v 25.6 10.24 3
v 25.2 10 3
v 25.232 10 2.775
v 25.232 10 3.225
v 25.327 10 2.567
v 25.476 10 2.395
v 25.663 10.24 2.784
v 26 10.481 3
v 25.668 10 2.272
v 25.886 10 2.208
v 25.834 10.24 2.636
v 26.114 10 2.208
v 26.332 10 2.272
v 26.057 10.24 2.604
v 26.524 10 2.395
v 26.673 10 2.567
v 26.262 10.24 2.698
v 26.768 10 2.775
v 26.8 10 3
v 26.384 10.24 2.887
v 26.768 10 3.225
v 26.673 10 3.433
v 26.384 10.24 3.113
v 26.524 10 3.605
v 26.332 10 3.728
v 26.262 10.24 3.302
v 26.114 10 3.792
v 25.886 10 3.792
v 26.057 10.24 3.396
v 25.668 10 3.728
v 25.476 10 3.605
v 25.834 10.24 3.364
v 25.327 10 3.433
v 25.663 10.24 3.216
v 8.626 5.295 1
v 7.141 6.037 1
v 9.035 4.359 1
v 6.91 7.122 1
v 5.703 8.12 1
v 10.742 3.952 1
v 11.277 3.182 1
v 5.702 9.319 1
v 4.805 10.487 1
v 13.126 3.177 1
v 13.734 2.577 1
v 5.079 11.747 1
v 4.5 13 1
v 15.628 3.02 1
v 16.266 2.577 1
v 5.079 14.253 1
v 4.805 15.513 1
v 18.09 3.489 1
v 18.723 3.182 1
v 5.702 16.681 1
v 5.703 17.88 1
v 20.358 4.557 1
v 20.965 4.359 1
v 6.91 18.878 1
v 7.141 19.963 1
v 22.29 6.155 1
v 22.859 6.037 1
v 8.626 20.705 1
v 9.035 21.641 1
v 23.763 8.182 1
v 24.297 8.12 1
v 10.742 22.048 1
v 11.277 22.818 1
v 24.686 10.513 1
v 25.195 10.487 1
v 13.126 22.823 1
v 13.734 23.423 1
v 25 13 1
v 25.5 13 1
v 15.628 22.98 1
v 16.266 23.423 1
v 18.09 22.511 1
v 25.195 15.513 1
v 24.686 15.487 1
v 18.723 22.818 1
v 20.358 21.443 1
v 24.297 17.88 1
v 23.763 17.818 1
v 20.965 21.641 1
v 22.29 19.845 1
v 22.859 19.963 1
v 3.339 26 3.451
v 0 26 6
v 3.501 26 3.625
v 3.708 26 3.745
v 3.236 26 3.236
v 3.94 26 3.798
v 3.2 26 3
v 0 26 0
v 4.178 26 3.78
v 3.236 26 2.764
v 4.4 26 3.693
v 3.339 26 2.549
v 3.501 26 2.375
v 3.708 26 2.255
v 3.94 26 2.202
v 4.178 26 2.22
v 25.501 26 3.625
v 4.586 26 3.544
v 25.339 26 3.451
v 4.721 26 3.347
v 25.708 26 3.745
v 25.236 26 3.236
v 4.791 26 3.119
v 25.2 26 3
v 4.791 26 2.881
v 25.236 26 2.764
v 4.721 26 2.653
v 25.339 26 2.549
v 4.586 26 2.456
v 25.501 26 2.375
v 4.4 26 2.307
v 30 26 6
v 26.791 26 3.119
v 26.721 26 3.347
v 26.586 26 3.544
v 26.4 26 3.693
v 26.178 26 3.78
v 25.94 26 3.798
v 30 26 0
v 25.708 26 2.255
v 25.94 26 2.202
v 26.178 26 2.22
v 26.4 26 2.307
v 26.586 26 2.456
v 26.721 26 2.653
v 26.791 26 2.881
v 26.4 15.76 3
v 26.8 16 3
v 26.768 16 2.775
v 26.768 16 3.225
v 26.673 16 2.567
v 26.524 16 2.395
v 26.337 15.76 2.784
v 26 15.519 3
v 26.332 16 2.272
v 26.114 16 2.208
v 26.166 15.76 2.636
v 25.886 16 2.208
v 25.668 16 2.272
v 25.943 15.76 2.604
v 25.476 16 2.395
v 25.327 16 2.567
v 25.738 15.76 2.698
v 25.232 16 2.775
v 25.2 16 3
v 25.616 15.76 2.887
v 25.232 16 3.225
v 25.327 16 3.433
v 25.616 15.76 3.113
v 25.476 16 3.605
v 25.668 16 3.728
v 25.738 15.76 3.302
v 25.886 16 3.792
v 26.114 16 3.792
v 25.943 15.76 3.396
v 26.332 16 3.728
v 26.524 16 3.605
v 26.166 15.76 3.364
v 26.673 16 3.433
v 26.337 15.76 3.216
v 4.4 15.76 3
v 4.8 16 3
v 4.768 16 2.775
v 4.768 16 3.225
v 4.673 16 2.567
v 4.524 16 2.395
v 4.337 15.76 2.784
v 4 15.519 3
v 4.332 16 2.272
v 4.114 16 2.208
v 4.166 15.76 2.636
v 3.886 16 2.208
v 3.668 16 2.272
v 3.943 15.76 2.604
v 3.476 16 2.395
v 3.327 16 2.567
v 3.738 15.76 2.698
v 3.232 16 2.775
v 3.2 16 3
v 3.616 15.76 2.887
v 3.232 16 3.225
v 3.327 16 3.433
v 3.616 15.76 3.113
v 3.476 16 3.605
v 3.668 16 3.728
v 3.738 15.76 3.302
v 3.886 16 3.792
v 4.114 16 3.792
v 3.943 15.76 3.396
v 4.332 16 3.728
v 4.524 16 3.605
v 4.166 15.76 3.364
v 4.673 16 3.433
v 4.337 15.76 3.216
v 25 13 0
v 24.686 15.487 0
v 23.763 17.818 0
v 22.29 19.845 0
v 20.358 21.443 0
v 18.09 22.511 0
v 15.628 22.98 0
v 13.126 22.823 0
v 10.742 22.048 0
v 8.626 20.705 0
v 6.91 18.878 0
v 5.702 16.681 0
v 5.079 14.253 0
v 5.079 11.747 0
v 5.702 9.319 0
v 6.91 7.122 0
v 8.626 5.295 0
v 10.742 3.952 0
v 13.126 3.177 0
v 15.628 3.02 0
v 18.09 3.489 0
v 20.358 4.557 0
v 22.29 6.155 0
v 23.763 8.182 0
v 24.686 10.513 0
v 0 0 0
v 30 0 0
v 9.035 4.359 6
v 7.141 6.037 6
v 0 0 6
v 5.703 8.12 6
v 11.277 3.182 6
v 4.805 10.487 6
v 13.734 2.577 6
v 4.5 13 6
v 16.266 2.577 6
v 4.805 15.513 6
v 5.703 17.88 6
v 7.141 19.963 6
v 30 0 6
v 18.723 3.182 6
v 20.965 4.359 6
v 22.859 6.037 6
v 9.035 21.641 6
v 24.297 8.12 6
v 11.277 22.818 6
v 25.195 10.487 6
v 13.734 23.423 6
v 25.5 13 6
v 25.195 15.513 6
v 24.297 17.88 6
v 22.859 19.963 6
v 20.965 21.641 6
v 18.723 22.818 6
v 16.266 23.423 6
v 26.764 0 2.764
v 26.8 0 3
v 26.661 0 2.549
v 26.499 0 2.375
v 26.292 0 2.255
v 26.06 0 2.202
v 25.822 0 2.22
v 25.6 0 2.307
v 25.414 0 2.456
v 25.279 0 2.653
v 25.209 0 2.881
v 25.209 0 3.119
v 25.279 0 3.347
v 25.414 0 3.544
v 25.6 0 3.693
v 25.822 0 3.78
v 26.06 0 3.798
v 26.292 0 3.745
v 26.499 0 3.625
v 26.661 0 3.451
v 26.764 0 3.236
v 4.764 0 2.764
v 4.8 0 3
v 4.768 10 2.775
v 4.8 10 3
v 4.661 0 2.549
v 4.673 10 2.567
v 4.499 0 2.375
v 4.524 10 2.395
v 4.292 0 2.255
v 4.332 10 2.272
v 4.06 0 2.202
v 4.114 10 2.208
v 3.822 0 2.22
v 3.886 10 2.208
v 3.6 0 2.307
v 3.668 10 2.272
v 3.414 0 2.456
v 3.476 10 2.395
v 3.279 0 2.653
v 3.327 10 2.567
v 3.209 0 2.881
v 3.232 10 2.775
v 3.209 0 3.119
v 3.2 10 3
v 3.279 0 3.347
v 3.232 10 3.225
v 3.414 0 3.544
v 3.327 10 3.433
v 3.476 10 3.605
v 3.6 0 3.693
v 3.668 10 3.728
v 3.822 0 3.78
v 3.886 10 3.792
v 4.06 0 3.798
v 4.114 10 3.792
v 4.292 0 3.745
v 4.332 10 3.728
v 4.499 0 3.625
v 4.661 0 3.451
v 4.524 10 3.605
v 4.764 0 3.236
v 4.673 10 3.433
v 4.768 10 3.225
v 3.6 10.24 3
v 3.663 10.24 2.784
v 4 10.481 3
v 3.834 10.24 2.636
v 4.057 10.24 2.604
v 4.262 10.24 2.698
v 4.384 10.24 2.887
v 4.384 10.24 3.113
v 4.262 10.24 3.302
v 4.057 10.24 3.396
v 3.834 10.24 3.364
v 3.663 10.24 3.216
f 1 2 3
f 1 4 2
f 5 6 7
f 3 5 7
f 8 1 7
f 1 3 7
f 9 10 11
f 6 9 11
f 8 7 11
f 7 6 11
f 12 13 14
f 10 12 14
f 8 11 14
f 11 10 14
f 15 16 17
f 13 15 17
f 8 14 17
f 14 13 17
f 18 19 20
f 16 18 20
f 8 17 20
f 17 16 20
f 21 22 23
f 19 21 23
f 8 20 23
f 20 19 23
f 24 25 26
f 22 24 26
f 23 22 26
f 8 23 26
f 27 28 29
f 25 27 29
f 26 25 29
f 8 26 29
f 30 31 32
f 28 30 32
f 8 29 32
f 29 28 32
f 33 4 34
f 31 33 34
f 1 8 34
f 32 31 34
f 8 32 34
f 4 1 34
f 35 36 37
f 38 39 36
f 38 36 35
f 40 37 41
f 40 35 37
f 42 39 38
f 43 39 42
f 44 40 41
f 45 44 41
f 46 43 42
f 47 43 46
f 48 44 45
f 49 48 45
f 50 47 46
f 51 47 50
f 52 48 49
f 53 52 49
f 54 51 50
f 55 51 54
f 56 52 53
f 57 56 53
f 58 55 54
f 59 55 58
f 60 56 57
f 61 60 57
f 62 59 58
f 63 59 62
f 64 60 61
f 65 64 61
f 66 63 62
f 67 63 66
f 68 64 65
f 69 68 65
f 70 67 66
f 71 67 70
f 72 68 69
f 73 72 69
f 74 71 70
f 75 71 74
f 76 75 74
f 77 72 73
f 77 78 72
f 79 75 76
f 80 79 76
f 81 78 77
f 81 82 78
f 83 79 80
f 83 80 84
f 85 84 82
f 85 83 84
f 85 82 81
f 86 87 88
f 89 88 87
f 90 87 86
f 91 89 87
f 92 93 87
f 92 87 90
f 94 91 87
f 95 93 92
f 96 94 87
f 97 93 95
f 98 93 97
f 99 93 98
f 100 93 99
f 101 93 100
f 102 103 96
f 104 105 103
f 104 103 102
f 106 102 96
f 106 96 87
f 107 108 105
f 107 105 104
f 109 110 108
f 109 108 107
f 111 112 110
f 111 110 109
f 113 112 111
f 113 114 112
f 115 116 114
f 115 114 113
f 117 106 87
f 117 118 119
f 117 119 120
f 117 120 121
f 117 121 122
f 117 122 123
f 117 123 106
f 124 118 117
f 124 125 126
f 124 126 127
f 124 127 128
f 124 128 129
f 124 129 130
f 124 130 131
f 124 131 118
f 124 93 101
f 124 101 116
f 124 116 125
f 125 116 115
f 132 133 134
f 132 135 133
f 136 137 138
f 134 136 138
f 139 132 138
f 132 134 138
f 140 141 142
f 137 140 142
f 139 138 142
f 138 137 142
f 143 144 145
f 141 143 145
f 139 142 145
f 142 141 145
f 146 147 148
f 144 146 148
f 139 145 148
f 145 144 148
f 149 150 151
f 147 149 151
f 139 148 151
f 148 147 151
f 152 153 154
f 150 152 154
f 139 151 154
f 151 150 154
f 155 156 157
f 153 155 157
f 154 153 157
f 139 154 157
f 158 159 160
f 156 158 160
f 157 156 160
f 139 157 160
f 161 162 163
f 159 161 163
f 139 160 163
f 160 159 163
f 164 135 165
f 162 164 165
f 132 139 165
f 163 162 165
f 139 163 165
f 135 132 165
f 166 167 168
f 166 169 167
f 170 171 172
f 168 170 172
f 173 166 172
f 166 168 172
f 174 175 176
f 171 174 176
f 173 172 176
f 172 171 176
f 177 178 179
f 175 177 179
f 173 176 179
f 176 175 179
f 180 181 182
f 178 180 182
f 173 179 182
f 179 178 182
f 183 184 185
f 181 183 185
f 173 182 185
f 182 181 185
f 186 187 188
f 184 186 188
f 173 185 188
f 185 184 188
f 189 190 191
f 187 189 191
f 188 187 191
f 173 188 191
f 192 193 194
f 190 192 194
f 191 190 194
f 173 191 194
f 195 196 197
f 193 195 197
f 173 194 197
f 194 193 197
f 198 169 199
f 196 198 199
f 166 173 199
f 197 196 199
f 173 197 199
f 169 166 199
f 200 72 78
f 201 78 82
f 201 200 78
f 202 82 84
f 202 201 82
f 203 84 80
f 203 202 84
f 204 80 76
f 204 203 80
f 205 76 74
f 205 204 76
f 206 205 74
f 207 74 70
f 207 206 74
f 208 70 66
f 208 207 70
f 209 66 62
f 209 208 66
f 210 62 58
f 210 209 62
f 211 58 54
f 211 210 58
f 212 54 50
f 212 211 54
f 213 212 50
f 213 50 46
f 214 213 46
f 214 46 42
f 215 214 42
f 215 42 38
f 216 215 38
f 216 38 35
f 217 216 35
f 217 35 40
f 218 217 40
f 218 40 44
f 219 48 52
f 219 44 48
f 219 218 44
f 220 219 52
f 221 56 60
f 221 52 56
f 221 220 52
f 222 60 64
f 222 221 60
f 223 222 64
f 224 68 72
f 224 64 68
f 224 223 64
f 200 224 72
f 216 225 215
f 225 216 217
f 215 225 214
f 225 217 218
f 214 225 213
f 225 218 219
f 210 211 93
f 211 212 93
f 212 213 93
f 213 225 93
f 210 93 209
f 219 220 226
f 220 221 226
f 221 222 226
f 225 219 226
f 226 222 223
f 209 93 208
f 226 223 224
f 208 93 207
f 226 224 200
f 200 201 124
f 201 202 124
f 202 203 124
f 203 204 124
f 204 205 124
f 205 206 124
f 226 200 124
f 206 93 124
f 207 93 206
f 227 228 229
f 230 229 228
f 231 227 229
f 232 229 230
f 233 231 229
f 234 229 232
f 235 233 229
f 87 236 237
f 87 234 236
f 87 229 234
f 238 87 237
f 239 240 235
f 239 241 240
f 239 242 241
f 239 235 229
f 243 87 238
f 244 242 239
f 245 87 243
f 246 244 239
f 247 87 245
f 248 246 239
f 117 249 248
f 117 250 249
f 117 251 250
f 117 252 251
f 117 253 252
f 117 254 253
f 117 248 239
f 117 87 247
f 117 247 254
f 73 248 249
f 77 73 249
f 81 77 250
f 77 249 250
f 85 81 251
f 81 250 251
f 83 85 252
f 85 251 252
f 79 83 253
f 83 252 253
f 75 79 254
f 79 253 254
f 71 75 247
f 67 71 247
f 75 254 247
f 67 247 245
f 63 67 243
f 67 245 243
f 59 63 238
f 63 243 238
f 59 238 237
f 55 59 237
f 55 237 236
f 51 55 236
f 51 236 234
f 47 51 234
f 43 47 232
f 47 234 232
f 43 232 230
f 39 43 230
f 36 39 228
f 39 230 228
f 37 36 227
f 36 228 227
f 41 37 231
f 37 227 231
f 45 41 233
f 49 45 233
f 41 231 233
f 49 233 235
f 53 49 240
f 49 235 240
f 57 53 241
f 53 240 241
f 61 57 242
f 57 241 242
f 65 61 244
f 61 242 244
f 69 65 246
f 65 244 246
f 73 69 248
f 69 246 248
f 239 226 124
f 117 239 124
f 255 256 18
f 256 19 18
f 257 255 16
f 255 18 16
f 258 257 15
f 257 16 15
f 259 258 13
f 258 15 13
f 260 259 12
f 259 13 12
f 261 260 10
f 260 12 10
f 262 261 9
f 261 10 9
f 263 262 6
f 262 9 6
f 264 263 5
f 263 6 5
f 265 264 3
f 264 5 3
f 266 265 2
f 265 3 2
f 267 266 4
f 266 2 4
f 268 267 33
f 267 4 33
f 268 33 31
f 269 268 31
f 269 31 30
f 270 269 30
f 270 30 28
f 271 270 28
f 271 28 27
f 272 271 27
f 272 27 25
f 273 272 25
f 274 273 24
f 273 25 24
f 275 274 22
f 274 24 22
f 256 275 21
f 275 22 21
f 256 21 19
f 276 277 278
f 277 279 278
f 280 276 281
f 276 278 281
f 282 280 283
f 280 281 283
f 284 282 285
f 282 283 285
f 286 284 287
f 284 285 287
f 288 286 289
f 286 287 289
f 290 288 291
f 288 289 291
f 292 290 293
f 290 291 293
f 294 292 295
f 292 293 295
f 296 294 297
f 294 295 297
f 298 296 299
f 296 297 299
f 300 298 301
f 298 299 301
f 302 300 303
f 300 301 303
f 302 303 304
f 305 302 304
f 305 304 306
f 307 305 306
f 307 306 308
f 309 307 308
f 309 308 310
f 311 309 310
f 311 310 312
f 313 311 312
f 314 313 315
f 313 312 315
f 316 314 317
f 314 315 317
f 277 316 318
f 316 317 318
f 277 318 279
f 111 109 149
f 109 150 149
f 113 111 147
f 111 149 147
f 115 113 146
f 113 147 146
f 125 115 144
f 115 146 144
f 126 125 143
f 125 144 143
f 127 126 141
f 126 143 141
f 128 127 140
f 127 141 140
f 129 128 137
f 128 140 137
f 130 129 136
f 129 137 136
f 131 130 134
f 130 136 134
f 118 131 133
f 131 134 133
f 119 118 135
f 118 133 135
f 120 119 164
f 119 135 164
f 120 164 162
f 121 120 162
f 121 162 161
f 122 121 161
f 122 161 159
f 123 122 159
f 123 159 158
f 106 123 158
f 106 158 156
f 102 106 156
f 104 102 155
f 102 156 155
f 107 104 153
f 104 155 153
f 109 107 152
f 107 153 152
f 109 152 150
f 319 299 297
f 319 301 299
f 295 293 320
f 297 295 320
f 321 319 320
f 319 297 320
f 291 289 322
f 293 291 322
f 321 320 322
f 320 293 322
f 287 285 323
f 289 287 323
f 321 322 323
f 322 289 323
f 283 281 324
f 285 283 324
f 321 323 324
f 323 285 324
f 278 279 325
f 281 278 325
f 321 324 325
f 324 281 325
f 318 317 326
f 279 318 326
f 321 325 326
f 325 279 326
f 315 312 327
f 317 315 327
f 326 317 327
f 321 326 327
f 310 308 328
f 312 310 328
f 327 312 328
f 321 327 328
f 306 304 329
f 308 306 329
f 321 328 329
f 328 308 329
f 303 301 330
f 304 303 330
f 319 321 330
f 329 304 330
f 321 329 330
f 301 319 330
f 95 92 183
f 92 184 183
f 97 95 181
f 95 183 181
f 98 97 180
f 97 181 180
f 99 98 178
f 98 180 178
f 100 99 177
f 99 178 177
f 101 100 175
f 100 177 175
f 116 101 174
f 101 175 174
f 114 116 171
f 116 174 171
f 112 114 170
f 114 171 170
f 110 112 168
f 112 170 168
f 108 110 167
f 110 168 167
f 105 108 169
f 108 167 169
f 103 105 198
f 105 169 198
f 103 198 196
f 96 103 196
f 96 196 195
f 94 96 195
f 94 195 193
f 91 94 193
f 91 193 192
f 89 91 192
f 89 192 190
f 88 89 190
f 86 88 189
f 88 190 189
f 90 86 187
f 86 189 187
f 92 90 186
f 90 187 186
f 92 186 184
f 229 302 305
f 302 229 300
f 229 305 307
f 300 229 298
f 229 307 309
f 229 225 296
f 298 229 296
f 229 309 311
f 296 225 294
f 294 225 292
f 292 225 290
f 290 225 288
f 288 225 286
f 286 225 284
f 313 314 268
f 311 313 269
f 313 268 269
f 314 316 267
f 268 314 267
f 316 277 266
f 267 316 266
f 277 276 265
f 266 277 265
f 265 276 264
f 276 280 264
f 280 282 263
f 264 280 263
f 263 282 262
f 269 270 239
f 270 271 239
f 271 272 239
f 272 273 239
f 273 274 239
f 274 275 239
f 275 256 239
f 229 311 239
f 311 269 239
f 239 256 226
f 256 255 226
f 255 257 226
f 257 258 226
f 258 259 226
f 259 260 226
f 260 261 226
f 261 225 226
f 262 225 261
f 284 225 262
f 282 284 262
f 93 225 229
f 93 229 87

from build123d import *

# Parameters (mm, degrees)
ESQUISSE1_W                                   = 30
ESQUISSE1_H                                   = 26
ESQUISSE1_R                                   = 10
BOSS_EXTRU_1_DEPTH                            = 6
ESQUISSE2_R                                   = 10.5
ENL_V_MAT_EXTRU_1_DEPTH                       = 5
TROU_POUR_TARAUDAGE_POUR_TROU_TARAUD_M2_D     = 1.6
TROU_POUR_TARAUDAGE_POUR_TROU_TARAUD_M2_DEPTH = 10
TROU_POUR_TARAUDAGE_POUR_TROU_TARAUD_M2_TIP   = 0.480688495
TROU_POUR_TARAUDAGE_POUR_TROU_TARAUD_2_D      = 1.6
TROU_POUR_TARAUDAGE_POUR_TROU_TARAUD_2_DEPTH  = 10
TROU_POUR_TARAUDAGE_POUR_TROU_TARAUD_2_TIP    = 0.480688495


with BuildPart() as part:
    # Esquisse1 → Boss.-Extru.1 (new body)
    with BuildSketch(Plane.XY):
        with Locations((15, 13)):
            Rectangle(ESQUISSE1_W, ESQUISSE1_H)
        with Locations((15, 13)):
            Circle(ESQUISSE1_R, mode=Mode.SUBTRACT)
    extrude(amount=BOSS_EXTRU_1_DEPTH)

    # Esquisse2 → Enlèv. mat.-Extru.1 (cut)
    with BuildSketch(Plane.XY.offset(6)):
        with Locations((15, 13)):
            Circle(ESQUISSE2_R)
    extrude(amount=-ENL_V_MAT_EXTRU_1_DEPTH, mode=Mode.SUBTRACT)

    # Trou pour taraudage pour trou taraud_ M2
    with Locations(Plane(origin=(0, 26, 0), x_dir=(1, 0, 0), z_dir=(0, 1, 0))):
        with Locations((4, -3), (26, -3)):
            Hole(TROU_POUR_TARAUDAGE_POUR_TROU_TARAUD_M2_D / 2, depth=TROU_POUR_TARAUDAGE_POUR_TROU_TARAUD_M2_DEPTH)
            with Locations((0, 0, -(TROU_POUR_TARAUDAGE_POUR_TROU_TARAUD_M2_DEPTH + TROU_POUR_TARAUDAGE_POUR_TROU_TARAUD_M2_TIP / 2))):  # 118° drill point
                Cone(0, TROU_POUR_TARAUDAGE_POUR_TROU_TARAUD_M2_D / 2, TROU_POUR_TARAUDAGE_POUR_TROU_TARAUD_M2_TIP, mode=Mode.SUBTRACT)

    # Trou pour taraudage pour trou taraud 2
    with Locations(Plane(origin=(0, 0, 0), x_dir=(-1, 0, 0), z_dir=(0, -1, 0))):
        with Locations((-26, -3), (-4, -3)):
            Hole(TROU_POUR_TARAUDAGE_POUR_TROU_TARAUD_2_D / 2, depth=TROU_POUR_TARAUDAGE_POUR_TROU_TARAUD_2_DEPTH)
            with Locations((0, 0, -(TROU_POUR_TARAUDAGE_POUR_TROU_TARAUD_2_DEPTH + TROU_POUR_TARAUDAGE_POUR_TROU_TARAUD_2_TIP / 2))):  # 118° drill point
                Cone(0, TROU_POUR_TARAUDAGE_POUR_TROU_TARAUD_2_D / 2, TROU_POUR_TARAUDAGE_POUR_TROU_TARAUD_2_TIP, mode=Mode.SUBTRACT)


solid = part.part
